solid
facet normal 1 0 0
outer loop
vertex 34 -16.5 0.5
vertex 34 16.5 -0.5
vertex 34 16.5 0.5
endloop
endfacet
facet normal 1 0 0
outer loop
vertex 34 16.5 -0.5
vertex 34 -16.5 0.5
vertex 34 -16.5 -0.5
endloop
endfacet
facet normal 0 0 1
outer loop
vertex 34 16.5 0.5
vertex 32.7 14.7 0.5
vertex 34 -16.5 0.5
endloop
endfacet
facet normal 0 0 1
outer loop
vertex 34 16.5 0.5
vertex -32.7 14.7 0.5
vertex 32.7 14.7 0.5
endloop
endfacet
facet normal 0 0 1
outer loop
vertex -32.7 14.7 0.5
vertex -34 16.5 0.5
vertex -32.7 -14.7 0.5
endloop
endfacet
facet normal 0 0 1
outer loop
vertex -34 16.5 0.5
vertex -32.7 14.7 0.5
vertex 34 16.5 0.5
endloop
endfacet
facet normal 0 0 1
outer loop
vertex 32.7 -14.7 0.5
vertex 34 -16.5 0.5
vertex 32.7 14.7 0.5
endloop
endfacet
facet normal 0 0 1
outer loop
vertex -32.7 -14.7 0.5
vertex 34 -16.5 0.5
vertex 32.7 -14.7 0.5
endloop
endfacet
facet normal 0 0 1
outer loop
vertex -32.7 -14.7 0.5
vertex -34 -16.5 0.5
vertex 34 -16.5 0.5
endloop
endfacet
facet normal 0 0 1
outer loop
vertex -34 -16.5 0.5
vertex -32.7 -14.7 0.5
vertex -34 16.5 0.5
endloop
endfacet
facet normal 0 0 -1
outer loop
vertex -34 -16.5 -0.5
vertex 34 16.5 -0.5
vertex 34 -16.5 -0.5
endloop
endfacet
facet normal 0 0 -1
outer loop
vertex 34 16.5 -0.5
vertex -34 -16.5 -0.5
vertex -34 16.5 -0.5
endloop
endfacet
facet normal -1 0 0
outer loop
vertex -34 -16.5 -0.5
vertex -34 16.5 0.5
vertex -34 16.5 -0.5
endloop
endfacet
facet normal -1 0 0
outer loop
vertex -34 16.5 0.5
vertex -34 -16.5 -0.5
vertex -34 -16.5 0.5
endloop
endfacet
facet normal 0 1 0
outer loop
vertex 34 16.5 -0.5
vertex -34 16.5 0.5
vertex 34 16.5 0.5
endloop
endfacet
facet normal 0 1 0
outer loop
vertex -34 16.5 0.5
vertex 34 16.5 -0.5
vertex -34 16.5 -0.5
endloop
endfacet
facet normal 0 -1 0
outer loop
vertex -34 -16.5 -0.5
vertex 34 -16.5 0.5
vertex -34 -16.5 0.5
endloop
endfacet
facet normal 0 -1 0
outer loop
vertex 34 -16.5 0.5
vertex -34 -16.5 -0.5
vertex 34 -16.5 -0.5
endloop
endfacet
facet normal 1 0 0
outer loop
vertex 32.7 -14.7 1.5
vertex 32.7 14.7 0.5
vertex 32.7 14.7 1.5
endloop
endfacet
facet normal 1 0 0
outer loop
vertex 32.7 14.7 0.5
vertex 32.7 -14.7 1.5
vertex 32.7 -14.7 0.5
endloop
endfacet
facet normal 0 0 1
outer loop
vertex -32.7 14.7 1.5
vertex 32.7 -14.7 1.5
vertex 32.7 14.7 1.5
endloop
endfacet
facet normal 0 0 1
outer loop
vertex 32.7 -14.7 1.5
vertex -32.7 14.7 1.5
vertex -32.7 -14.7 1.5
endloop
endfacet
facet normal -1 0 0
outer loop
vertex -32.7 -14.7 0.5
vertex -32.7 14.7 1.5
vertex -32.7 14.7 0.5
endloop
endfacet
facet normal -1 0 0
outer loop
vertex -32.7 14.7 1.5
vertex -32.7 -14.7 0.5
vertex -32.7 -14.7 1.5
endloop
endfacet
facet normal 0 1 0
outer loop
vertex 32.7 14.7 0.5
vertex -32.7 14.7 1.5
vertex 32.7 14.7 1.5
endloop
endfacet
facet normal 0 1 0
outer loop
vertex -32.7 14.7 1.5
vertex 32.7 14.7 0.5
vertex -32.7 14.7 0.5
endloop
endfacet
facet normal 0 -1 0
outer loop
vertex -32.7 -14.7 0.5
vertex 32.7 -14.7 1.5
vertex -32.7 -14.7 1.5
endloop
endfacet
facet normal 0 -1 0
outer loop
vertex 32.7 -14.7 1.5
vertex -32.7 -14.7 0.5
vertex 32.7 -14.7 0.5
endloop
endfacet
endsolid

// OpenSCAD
cube([68, 33, 1], center=true);
translate([0,0,1])
    cube([65.4, 29.4, 1], center=true);
